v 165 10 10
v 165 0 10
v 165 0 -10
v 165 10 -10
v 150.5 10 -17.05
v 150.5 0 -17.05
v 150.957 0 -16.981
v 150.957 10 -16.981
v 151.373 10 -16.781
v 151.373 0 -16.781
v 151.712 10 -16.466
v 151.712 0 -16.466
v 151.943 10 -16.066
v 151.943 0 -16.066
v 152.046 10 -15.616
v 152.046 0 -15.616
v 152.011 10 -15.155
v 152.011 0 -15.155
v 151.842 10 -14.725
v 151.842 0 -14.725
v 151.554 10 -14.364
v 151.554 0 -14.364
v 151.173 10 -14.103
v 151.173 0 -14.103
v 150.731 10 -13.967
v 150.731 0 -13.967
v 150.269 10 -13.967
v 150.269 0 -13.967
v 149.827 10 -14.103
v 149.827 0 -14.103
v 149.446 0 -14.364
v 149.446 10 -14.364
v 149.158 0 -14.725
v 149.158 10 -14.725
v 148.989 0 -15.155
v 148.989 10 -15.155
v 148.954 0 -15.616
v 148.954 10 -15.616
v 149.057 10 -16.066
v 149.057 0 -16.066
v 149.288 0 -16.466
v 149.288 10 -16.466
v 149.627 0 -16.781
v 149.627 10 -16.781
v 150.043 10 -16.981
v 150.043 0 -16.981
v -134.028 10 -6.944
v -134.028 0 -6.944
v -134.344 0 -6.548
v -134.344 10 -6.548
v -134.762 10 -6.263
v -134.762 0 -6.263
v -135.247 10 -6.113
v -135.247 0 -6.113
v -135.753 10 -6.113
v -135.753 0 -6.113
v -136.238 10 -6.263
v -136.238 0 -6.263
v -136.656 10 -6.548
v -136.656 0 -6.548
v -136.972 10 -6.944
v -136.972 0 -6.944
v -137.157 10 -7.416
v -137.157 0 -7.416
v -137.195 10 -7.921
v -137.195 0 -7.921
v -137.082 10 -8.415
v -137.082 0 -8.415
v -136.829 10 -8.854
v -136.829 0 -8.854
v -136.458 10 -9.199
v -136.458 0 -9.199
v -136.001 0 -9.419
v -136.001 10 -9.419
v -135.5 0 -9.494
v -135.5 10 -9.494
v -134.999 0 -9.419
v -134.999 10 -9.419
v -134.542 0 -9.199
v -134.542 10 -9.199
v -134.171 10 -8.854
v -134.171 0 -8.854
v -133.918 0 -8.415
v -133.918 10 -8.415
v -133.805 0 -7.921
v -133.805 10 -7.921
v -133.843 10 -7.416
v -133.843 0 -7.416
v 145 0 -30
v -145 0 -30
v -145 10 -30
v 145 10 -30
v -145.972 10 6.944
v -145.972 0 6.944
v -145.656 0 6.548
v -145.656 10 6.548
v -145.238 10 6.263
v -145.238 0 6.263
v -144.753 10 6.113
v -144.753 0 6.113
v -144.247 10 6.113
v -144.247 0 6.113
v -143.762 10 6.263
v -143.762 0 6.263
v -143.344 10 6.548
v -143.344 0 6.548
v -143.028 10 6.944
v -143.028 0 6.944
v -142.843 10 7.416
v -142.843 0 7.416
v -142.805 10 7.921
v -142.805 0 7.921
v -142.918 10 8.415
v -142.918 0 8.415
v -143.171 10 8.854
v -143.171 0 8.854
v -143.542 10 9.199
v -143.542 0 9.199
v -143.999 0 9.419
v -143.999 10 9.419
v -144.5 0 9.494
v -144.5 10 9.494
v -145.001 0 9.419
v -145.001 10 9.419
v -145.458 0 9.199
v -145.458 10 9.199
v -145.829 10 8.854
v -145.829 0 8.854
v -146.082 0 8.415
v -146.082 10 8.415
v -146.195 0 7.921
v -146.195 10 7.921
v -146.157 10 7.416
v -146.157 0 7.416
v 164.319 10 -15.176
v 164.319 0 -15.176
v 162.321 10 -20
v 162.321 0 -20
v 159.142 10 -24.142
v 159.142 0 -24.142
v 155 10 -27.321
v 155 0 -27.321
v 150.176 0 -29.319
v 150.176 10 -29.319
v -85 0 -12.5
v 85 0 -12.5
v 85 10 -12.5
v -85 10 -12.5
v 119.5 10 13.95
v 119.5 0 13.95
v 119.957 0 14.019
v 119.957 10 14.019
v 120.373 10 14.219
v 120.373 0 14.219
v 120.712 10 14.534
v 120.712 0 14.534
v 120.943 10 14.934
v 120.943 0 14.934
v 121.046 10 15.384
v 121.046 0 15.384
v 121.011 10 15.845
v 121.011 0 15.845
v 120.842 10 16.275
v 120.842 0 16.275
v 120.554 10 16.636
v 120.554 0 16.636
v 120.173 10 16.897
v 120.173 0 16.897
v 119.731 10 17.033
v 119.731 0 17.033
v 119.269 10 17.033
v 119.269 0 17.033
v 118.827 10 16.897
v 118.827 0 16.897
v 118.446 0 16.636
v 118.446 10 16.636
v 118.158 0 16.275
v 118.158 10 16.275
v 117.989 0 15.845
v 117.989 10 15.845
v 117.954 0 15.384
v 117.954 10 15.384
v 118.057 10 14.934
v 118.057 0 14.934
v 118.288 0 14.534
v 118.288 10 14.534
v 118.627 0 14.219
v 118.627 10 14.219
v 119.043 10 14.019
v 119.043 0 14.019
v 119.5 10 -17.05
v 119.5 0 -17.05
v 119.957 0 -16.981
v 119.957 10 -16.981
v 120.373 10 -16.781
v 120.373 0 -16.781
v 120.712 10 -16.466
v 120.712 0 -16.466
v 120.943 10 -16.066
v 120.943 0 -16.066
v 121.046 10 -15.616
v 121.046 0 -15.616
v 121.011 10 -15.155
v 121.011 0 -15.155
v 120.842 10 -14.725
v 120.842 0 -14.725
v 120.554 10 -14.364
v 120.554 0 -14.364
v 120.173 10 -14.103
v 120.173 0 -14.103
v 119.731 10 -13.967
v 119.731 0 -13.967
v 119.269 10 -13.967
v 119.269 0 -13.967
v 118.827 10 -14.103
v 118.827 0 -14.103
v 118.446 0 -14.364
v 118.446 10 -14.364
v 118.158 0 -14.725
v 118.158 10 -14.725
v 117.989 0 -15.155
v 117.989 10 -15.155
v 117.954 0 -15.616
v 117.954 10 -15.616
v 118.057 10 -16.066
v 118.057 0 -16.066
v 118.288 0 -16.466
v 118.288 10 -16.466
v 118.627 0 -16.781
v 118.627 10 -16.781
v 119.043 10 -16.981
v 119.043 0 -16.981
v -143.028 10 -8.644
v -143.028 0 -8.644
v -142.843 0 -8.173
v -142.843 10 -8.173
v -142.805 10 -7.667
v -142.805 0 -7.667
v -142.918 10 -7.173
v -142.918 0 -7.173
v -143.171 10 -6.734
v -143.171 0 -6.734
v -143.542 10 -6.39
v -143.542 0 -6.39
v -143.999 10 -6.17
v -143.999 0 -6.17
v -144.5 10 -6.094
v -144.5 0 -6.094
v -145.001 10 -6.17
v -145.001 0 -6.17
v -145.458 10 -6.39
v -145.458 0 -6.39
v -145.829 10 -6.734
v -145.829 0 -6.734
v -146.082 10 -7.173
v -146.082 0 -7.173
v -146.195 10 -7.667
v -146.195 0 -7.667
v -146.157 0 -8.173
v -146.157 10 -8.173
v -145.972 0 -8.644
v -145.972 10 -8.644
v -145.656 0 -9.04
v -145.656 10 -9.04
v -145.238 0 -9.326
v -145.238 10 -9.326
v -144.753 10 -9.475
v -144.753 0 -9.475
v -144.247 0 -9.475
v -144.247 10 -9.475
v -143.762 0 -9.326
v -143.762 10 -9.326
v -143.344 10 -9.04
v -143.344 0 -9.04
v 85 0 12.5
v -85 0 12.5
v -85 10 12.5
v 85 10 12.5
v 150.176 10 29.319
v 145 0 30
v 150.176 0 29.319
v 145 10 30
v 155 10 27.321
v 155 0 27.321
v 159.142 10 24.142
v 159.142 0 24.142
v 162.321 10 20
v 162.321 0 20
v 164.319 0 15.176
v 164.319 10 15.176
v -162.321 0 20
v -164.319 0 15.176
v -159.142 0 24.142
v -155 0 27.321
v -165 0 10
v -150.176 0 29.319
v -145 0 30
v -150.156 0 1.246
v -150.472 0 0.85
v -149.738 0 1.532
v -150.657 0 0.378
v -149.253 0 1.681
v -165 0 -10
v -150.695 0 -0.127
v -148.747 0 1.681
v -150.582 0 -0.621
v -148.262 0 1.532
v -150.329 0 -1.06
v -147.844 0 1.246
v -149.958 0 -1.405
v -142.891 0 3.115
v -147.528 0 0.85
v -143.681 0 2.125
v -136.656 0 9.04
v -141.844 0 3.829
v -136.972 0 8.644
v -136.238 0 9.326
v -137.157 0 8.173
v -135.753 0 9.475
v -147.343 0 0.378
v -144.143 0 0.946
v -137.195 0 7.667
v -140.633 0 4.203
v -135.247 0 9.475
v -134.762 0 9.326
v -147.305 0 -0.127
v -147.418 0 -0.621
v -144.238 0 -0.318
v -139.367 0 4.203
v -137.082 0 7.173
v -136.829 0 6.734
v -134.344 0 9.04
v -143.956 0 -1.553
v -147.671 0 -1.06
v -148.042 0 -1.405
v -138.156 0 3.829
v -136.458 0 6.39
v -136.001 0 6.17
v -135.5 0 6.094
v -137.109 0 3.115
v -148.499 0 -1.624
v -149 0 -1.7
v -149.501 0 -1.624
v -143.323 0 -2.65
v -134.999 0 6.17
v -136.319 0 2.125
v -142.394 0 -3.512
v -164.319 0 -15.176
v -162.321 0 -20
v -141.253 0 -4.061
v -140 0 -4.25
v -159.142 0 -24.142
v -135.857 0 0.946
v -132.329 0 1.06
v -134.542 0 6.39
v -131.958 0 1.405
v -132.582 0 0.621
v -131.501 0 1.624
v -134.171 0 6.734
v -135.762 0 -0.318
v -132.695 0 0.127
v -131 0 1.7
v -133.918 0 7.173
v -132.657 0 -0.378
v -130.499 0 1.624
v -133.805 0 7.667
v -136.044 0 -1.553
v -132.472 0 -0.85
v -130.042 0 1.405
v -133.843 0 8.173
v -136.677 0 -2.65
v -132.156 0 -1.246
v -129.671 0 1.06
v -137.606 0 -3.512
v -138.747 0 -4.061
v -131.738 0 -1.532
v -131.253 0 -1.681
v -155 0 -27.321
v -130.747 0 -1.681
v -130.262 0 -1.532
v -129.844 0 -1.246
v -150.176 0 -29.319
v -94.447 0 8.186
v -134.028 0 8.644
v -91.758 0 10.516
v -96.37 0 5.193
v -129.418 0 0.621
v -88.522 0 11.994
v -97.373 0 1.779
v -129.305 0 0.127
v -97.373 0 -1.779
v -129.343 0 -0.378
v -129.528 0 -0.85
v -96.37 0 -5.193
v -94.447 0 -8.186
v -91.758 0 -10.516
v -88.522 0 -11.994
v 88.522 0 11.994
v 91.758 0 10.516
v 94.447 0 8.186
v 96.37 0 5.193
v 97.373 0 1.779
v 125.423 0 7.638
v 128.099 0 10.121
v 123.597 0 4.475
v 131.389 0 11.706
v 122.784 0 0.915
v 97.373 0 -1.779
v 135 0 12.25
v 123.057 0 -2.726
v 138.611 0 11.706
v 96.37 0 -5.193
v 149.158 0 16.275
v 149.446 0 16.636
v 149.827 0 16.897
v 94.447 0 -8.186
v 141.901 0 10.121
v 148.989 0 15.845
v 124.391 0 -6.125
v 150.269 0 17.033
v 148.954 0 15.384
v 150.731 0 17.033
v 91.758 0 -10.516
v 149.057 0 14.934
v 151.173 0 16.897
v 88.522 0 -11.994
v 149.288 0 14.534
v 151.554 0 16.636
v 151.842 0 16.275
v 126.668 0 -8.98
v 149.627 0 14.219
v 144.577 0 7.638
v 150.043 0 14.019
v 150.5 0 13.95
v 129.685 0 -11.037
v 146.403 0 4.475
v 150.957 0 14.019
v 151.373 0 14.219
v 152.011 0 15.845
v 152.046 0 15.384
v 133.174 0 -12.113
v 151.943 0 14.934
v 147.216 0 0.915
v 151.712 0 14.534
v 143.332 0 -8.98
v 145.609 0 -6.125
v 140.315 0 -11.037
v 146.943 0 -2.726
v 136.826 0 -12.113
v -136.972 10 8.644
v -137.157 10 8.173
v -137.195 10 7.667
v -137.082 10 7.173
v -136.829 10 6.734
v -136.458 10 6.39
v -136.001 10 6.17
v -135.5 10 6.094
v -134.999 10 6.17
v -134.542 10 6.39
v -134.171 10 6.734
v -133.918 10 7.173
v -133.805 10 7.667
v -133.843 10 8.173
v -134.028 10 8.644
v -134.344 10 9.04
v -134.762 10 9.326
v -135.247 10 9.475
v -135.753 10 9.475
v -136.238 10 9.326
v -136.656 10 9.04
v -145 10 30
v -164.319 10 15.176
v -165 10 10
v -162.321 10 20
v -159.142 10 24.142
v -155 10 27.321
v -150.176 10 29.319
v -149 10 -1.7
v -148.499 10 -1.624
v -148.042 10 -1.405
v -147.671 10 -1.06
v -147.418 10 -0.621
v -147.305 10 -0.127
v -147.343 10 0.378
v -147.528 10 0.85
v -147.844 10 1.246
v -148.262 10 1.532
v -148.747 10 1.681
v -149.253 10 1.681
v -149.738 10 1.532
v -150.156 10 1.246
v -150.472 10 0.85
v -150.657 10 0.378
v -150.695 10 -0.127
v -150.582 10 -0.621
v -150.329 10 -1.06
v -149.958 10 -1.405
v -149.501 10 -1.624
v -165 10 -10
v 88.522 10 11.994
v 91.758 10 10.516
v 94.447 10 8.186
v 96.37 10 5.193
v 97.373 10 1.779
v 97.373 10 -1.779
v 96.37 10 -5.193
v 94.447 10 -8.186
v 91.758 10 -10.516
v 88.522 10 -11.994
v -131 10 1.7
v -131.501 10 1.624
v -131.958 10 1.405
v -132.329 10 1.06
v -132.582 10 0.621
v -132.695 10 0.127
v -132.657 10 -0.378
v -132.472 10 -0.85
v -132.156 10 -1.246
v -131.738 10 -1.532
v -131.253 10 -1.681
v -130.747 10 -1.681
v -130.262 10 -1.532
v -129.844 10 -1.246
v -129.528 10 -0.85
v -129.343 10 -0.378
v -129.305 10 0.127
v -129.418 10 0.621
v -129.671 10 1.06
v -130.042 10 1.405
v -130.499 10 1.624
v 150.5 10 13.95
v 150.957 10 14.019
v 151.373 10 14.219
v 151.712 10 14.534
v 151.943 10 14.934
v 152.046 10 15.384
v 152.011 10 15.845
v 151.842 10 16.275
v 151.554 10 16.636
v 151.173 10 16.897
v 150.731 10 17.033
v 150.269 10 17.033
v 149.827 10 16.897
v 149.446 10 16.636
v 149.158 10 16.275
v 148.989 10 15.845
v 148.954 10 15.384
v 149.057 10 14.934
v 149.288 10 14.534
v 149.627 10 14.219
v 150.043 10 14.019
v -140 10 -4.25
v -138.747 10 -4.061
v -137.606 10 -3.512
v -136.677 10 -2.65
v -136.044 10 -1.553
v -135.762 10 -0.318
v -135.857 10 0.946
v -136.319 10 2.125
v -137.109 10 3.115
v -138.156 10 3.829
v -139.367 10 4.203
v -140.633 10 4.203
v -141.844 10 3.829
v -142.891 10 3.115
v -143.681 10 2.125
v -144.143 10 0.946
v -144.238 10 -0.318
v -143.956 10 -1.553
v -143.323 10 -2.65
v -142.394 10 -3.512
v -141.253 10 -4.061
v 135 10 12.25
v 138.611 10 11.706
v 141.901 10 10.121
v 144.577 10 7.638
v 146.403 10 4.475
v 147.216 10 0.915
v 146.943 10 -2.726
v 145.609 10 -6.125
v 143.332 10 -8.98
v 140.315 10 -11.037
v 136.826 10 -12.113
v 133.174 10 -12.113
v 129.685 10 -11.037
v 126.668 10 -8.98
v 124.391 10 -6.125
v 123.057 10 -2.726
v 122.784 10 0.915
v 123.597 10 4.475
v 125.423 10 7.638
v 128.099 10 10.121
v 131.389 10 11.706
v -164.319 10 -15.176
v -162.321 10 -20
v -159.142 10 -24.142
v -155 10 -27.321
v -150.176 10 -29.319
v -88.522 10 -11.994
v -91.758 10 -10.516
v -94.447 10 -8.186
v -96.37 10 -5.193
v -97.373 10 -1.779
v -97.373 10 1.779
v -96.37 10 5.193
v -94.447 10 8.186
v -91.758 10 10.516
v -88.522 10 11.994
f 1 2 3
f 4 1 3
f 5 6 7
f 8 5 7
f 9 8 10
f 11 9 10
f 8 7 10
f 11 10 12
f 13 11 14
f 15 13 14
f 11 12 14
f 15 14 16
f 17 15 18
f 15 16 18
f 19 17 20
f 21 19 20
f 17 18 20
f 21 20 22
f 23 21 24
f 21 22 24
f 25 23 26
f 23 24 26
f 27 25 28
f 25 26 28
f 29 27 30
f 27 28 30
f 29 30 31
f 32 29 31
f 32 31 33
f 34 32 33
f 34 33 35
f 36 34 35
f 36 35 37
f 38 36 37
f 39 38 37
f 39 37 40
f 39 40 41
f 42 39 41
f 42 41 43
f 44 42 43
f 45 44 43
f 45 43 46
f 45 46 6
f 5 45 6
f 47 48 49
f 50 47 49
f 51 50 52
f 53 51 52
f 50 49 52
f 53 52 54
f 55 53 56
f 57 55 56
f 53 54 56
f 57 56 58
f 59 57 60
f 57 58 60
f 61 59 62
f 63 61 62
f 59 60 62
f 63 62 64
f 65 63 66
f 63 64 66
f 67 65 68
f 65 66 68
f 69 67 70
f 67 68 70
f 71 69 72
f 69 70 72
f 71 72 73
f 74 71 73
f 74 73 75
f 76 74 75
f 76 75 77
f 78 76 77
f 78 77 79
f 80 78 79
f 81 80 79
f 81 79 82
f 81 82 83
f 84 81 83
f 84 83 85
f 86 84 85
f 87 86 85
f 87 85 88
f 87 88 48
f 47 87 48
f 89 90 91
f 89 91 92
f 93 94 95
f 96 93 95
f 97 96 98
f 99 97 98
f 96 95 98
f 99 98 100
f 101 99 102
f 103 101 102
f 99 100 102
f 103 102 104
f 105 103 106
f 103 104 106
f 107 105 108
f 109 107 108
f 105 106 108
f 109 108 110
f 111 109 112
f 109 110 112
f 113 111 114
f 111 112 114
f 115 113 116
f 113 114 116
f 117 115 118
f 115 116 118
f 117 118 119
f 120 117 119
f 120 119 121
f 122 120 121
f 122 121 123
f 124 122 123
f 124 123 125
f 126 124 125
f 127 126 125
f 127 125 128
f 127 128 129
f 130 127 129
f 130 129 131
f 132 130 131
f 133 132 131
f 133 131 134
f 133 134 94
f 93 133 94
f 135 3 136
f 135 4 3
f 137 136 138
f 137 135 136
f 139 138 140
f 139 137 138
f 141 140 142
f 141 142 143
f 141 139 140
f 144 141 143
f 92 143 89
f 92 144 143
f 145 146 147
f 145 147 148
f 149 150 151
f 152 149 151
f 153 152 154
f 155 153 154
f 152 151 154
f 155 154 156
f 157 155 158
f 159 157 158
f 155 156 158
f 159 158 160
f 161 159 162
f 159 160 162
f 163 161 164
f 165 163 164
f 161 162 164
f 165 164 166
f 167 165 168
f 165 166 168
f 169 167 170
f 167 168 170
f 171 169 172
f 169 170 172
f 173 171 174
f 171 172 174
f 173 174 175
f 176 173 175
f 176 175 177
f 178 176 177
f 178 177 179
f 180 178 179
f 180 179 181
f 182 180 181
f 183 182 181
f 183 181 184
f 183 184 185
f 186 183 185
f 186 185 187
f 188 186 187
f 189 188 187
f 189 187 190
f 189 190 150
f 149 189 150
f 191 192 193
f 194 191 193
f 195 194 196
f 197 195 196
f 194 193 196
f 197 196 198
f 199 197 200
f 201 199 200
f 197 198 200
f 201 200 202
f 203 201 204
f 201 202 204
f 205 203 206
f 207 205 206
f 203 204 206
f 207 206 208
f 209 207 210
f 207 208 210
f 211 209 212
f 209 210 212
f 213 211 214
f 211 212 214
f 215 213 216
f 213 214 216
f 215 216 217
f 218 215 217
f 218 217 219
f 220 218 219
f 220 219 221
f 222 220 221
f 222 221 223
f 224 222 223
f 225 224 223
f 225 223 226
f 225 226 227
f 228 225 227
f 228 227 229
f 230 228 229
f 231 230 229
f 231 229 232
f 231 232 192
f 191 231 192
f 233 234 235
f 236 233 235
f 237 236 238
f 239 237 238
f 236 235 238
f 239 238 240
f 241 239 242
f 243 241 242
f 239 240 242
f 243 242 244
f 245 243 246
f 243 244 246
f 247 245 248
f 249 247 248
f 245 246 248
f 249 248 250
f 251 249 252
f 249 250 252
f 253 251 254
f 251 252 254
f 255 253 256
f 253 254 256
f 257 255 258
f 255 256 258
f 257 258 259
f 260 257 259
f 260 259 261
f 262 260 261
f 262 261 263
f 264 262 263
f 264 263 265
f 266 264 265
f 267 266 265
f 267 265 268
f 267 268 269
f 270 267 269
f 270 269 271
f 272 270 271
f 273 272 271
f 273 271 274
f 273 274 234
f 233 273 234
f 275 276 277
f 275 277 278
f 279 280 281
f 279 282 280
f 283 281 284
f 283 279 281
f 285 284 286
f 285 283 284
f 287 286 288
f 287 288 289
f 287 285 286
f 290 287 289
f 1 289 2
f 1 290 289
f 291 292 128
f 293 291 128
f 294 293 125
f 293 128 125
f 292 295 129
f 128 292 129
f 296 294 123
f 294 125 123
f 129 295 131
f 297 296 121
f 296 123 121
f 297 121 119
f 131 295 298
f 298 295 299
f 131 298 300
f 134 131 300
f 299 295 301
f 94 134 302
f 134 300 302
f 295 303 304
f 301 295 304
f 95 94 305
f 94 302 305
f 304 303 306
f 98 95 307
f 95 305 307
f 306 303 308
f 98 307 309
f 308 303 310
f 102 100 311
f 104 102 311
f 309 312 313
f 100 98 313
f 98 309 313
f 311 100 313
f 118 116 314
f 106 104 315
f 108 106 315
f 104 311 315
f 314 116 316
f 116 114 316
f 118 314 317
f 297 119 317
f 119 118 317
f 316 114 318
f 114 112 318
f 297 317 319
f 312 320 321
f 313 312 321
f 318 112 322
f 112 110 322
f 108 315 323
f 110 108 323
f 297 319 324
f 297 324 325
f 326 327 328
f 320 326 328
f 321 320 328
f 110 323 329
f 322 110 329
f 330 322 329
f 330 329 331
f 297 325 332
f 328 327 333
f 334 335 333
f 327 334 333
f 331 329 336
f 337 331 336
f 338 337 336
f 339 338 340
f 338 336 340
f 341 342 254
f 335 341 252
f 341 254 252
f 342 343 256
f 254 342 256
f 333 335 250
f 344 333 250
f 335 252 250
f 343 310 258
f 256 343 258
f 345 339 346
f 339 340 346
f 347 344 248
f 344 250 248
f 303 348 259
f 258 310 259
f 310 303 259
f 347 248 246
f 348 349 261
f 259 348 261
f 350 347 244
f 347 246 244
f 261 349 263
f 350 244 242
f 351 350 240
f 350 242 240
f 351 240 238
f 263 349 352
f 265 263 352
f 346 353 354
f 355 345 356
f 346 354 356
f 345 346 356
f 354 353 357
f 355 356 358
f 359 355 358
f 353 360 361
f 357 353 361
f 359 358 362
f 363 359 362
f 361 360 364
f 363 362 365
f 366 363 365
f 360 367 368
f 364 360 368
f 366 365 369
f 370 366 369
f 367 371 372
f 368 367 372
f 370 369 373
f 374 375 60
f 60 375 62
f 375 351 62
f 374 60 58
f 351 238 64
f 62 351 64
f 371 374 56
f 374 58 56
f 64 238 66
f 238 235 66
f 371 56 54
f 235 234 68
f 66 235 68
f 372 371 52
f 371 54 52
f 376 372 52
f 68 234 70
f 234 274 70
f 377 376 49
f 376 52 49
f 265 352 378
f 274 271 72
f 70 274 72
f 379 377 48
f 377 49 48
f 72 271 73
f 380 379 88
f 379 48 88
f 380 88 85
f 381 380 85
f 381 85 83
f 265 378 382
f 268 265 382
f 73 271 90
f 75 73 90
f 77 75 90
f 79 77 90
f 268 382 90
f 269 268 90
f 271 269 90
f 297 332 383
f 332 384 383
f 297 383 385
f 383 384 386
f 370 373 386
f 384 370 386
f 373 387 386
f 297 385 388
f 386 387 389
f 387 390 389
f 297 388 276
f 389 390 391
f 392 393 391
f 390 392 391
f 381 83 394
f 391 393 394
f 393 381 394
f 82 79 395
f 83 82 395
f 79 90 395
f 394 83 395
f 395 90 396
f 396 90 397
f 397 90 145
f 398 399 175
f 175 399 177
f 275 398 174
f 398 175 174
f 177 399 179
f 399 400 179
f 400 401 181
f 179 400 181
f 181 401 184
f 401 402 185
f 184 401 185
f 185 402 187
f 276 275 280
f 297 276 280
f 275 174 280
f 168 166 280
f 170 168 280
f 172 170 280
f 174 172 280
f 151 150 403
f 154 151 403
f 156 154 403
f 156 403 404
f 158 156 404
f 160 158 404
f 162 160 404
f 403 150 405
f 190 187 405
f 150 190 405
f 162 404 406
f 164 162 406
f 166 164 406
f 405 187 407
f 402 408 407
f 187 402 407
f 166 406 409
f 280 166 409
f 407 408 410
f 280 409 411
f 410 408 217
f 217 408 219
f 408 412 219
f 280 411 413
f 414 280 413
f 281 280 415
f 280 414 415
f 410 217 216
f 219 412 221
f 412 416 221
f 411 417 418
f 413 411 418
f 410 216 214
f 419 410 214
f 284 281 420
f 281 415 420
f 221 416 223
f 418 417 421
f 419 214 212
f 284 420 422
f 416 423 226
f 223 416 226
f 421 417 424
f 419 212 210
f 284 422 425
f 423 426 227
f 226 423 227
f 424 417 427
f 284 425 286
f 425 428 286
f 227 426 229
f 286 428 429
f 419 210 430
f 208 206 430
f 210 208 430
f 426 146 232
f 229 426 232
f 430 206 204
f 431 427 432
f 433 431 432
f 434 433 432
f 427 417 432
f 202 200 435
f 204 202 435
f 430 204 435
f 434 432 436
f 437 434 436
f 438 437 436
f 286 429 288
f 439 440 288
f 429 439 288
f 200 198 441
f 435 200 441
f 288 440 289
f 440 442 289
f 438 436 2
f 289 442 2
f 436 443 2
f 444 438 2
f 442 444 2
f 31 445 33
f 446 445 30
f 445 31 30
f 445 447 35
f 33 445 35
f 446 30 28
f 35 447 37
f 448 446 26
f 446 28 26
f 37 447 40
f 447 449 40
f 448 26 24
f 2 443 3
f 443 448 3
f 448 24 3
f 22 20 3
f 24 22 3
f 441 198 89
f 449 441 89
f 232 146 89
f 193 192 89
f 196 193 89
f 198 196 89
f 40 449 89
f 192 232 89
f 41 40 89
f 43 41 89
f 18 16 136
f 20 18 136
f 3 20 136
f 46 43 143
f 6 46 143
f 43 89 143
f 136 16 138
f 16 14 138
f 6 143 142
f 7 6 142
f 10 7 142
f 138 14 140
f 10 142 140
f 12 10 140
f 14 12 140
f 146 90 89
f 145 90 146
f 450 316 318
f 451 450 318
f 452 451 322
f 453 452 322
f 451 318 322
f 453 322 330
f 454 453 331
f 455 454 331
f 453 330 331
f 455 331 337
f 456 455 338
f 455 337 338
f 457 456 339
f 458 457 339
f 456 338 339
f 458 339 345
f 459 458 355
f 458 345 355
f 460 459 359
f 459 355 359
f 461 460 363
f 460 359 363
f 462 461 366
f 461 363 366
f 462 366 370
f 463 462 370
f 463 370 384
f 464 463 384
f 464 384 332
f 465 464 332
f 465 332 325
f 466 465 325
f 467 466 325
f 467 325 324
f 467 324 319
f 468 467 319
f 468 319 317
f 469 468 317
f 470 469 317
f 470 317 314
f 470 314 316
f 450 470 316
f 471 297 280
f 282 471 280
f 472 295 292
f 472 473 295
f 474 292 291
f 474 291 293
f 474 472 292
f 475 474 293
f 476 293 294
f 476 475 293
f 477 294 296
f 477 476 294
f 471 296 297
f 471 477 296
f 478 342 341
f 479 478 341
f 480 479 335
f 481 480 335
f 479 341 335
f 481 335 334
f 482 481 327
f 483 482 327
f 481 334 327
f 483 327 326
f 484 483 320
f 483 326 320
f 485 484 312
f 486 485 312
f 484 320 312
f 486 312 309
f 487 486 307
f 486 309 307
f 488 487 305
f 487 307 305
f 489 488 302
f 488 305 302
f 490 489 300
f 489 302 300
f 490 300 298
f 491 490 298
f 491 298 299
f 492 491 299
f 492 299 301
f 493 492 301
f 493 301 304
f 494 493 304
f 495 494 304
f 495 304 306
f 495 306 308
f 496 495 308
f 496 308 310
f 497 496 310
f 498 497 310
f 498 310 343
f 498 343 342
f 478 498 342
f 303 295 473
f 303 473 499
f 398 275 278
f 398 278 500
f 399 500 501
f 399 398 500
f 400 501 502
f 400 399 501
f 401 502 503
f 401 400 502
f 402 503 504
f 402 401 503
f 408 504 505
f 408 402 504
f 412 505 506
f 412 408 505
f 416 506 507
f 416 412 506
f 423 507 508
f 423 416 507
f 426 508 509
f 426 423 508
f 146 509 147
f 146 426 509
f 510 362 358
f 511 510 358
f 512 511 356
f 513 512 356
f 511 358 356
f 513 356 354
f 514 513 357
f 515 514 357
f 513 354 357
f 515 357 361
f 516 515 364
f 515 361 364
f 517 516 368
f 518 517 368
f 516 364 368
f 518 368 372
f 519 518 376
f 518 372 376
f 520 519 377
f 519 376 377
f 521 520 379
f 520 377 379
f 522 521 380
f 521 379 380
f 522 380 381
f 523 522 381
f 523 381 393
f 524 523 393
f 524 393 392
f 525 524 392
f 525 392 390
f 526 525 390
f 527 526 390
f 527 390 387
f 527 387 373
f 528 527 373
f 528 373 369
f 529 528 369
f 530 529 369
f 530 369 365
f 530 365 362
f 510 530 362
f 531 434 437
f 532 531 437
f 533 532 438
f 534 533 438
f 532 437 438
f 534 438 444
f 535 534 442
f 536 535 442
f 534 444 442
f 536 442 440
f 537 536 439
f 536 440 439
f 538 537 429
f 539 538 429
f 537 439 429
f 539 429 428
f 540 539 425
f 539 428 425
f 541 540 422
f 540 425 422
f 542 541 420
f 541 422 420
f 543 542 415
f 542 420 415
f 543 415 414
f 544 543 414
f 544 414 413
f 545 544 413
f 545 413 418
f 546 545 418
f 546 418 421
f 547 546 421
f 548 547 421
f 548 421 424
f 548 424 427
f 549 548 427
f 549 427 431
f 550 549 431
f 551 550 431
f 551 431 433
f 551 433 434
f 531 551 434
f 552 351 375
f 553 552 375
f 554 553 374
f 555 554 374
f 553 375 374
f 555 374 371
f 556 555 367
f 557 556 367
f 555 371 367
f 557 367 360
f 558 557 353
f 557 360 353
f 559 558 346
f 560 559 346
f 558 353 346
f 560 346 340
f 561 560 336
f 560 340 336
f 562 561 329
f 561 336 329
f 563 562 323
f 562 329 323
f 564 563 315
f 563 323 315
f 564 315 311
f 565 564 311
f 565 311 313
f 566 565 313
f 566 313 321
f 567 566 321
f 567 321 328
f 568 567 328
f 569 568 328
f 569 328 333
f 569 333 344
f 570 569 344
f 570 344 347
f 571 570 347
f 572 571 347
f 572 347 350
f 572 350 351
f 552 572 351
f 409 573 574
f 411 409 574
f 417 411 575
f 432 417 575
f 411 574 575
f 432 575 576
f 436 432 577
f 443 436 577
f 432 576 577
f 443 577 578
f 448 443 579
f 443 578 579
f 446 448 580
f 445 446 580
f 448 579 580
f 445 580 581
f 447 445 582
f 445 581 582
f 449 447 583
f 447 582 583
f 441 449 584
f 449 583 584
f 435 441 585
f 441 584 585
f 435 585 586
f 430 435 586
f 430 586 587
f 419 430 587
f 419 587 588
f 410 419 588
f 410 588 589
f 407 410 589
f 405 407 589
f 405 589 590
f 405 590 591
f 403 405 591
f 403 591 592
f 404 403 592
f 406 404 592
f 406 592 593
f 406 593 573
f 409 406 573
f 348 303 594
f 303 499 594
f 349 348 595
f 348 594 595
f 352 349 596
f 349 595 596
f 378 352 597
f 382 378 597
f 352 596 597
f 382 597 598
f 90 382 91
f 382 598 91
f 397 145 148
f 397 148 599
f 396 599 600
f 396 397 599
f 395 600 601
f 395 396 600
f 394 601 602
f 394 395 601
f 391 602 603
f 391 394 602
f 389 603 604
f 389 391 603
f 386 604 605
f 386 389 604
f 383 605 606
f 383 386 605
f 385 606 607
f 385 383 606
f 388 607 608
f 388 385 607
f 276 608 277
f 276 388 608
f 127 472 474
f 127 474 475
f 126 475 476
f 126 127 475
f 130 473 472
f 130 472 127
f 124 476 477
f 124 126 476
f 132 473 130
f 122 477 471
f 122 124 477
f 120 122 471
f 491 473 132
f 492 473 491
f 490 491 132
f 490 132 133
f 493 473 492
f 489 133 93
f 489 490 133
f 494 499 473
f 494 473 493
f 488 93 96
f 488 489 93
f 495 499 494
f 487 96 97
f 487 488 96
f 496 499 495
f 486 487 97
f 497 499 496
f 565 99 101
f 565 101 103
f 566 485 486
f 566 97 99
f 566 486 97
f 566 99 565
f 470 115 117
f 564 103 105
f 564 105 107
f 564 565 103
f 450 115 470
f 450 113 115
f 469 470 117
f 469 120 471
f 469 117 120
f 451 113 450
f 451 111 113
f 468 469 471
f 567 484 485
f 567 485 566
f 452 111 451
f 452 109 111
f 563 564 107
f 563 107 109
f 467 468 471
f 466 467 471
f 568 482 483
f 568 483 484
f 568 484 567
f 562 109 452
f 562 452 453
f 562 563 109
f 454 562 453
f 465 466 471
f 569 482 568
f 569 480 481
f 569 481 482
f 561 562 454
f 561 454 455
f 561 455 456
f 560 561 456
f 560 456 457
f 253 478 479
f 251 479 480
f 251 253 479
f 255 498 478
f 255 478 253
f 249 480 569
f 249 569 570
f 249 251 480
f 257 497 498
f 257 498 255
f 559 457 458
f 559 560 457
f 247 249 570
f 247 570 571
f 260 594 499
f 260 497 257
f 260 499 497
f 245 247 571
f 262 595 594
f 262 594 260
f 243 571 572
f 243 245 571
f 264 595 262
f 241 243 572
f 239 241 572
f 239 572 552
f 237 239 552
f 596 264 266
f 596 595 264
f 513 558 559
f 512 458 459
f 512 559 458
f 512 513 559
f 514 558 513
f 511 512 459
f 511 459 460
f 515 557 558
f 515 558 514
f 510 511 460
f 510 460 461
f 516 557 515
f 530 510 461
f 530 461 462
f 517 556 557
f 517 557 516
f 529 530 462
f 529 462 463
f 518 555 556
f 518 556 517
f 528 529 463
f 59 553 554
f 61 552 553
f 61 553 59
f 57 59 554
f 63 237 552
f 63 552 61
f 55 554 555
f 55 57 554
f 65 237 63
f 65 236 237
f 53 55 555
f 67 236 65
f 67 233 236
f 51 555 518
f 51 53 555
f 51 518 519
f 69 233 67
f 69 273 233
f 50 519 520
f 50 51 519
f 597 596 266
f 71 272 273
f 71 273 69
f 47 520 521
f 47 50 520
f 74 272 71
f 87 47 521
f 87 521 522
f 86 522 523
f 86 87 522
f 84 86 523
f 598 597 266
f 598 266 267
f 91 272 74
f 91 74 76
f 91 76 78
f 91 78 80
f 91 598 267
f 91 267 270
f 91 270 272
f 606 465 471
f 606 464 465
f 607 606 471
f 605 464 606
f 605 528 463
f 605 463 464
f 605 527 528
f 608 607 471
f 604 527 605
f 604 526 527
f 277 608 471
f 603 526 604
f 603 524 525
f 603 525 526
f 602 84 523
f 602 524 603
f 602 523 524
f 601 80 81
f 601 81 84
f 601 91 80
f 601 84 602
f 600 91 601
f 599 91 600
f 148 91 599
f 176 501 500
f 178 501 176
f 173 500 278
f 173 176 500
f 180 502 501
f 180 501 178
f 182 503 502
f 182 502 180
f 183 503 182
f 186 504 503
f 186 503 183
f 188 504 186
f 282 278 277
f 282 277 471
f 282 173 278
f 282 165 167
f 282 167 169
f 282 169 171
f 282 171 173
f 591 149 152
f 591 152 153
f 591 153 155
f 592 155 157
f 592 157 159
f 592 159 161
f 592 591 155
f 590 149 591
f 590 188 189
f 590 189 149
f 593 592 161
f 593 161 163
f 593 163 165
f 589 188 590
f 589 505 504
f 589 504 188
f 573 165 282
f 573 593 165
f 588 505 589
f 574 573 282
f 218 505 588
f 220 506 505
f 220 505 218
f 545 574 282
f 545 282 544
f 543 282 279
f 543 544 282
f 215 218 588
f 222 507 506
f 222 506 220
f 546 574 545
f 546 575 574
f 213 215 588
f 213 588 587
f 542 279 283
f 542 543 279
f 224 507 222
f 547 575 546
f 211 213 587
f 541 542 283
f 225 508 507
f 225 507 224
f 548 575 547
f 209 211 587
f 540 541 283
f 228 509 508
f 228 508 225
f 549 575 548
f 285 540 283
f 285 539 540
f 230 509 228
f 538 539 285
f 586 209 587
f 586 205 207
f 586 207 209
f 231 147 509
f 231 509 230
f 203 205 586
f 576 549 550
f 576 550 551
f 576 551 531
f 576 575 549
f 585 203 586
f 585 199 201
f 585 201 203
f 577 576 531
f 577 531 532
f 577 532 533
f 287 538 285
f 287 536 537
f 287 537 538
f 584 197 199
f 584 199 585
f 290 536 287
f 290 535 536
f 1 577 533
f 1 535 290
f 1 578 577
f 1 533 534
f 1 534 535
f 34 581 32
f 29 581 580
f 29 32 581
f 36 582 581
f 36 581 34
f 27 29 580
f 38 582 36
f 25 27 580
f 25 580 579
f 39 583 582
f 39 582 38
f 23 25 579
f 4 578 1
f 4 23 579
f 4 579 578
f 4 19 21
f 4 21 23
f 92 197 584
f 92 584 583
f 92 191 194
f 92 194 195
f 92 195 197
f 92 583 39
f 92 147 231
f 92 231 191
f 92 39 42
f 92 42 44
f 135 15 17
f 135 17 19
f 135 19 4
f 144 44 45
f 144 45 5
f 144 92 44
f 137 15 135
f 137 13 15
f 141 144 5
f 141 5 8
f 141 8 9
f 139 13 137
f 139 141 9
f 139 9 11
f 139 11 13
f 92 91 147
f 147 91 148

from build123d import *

# Parameters (mm, degrees)
SKETCH_1_W               = 330
SKETCH_1_H               = 60
EXTRUDE_1_DEPTH          = 10
FILLET_1_R               = 20
SKETCH_5_R               = 12.25
CUT_EXTRUDE_3_DEPTH      = 12
SKETCH_9_R               = 1.55
CUT_EXTRUDE_6_DEPTH      = 169.002976164
SKETCH_11_R              = 4.25
CUT_EXTRUDE_8_DEPTH      = 169.002976164
CUT_EXTRUDE_11_DEPTH     = 169.002976164
SKETCH_16_R              = 1.7
CUT_EXTRUDE_12_DEPTH     = 169.002976164
PATTERN_CIRCULAR_1_COUNT = 6


with BuildPart() as part:
    # 草图1 → 凸台-拉伸1 (new body)
    with BuildSketch(Plane(origin=(0, 0, 0), x_dir=(1, 0, 0), z_dir=(0, 1, 0))):
        Rectangle(SKETCH_1_W, SKETCH_1_H)
    extrude(amount=EXTRUDE_1_DEPTH)

    # 圆角1
    fillet_1_edges = [part.edges().sort_by_distance(p)[0] for p in [
        (165, 5, 30),
        (-165, 5, 30),
        (-165, 5, -30),
        (165, 5, -30),
    ]]
    fillet(fillet_1_edges, radius=FILLET_1_R)

    # 草图5 → 切除-拉伸3 (cut)
    with BuildSketch(Plane(origin=(0, 10, 0), x_dir=(1, 0, 0), z_dir=(0, 1, 0))):
        with Locations(Location((135, 0, 0), (0, 0, 270))):
            Circle(SKETCH_5_R)
    extrude(amount=-CUT_EXTRUDE_3_DEPTH, mode=Mode.SUBTRACT)

    # 草图9 → 切除-拉伸6 (cut, through all)
    with BuildSketch(Plane.XZ):
        with Locations(Location((119.5, 15.5, 0), (0, 0, 270))):
            Circle(SKETCH_9_R)
        with Locations(Location((150.5, 15.5, 0), (0, 0, 270))):
            Circle(SKETCH_9_R)
        with Locations(Location((150.5, -15.5, 0), (0, 0, 270))):
            Circle(SKETCH_9_R)
        with Locations(Location((119.5, -15.5, 0), (0, 0, 270))):
            Circle(SKETCH_9_R)
    extrude(amount=-CUT_EXTRUDE_6_DEPTH, mode=Mode.SUBTRACT)

    # 草图11 → 切除-拉伸8 (cut, through all)
    with BuildSketch(Plane.XZ):
        with Locations(Location((-140, 0, 0), (0, 0, 270))):
            Circle(SKETCH_11_R)
    extrude(amount=-CUT_EXTRUDE_8_DEPTH, mode=Mode.SUBTRACT)

    # 草图15 → 切除-拉伸11 (cut, through all)
    with BuildSketch(Plane.XZ):
        with BuildLine():
            Line((-85, 12.5), (85, 12.5))
            ThreePointArc((85, 12.5), (97.5, 0), (85, -12.5))
            Line((85, -12.5), (-85, -12.5))
            ThreePointArc((-85, -12.5), (-97.5, 0), (-85, 12.5))
        make_face()
    extrude(amount=-CUT_EXTRUDE_11_DEPTH, mode=Mode.SUBTRACT)

    # 草图16 → 切除-拉伸12 (cut, through all)
    with BuildSketch(Plane.XZ):
        with Locations(Location((-149, 0, 0), (0, 0, 270))):
            Circle(SKETCH_16_R)
    cut_extrude_12 = extrude(amount=-CUT_EXTRUDE_12_DEPTH, mode=Mode.SUBTRACT)

    # 阵列(圆周)1: 切除-拉伸12 ×6 about axis
    pattern_circular_1_axis = Axis((-140, 0, 0), (0, 1, 0))
    for i in range(1, PATTERN_CIRCULAR_1_COUNT):
        add(cut_extrude_12.rotate(pattern_circular_1_axis, i * 360 / PATTERN_CIRCULAR_1_COUNT), mode=Mode.SUBTRACT)


solid = part.part
